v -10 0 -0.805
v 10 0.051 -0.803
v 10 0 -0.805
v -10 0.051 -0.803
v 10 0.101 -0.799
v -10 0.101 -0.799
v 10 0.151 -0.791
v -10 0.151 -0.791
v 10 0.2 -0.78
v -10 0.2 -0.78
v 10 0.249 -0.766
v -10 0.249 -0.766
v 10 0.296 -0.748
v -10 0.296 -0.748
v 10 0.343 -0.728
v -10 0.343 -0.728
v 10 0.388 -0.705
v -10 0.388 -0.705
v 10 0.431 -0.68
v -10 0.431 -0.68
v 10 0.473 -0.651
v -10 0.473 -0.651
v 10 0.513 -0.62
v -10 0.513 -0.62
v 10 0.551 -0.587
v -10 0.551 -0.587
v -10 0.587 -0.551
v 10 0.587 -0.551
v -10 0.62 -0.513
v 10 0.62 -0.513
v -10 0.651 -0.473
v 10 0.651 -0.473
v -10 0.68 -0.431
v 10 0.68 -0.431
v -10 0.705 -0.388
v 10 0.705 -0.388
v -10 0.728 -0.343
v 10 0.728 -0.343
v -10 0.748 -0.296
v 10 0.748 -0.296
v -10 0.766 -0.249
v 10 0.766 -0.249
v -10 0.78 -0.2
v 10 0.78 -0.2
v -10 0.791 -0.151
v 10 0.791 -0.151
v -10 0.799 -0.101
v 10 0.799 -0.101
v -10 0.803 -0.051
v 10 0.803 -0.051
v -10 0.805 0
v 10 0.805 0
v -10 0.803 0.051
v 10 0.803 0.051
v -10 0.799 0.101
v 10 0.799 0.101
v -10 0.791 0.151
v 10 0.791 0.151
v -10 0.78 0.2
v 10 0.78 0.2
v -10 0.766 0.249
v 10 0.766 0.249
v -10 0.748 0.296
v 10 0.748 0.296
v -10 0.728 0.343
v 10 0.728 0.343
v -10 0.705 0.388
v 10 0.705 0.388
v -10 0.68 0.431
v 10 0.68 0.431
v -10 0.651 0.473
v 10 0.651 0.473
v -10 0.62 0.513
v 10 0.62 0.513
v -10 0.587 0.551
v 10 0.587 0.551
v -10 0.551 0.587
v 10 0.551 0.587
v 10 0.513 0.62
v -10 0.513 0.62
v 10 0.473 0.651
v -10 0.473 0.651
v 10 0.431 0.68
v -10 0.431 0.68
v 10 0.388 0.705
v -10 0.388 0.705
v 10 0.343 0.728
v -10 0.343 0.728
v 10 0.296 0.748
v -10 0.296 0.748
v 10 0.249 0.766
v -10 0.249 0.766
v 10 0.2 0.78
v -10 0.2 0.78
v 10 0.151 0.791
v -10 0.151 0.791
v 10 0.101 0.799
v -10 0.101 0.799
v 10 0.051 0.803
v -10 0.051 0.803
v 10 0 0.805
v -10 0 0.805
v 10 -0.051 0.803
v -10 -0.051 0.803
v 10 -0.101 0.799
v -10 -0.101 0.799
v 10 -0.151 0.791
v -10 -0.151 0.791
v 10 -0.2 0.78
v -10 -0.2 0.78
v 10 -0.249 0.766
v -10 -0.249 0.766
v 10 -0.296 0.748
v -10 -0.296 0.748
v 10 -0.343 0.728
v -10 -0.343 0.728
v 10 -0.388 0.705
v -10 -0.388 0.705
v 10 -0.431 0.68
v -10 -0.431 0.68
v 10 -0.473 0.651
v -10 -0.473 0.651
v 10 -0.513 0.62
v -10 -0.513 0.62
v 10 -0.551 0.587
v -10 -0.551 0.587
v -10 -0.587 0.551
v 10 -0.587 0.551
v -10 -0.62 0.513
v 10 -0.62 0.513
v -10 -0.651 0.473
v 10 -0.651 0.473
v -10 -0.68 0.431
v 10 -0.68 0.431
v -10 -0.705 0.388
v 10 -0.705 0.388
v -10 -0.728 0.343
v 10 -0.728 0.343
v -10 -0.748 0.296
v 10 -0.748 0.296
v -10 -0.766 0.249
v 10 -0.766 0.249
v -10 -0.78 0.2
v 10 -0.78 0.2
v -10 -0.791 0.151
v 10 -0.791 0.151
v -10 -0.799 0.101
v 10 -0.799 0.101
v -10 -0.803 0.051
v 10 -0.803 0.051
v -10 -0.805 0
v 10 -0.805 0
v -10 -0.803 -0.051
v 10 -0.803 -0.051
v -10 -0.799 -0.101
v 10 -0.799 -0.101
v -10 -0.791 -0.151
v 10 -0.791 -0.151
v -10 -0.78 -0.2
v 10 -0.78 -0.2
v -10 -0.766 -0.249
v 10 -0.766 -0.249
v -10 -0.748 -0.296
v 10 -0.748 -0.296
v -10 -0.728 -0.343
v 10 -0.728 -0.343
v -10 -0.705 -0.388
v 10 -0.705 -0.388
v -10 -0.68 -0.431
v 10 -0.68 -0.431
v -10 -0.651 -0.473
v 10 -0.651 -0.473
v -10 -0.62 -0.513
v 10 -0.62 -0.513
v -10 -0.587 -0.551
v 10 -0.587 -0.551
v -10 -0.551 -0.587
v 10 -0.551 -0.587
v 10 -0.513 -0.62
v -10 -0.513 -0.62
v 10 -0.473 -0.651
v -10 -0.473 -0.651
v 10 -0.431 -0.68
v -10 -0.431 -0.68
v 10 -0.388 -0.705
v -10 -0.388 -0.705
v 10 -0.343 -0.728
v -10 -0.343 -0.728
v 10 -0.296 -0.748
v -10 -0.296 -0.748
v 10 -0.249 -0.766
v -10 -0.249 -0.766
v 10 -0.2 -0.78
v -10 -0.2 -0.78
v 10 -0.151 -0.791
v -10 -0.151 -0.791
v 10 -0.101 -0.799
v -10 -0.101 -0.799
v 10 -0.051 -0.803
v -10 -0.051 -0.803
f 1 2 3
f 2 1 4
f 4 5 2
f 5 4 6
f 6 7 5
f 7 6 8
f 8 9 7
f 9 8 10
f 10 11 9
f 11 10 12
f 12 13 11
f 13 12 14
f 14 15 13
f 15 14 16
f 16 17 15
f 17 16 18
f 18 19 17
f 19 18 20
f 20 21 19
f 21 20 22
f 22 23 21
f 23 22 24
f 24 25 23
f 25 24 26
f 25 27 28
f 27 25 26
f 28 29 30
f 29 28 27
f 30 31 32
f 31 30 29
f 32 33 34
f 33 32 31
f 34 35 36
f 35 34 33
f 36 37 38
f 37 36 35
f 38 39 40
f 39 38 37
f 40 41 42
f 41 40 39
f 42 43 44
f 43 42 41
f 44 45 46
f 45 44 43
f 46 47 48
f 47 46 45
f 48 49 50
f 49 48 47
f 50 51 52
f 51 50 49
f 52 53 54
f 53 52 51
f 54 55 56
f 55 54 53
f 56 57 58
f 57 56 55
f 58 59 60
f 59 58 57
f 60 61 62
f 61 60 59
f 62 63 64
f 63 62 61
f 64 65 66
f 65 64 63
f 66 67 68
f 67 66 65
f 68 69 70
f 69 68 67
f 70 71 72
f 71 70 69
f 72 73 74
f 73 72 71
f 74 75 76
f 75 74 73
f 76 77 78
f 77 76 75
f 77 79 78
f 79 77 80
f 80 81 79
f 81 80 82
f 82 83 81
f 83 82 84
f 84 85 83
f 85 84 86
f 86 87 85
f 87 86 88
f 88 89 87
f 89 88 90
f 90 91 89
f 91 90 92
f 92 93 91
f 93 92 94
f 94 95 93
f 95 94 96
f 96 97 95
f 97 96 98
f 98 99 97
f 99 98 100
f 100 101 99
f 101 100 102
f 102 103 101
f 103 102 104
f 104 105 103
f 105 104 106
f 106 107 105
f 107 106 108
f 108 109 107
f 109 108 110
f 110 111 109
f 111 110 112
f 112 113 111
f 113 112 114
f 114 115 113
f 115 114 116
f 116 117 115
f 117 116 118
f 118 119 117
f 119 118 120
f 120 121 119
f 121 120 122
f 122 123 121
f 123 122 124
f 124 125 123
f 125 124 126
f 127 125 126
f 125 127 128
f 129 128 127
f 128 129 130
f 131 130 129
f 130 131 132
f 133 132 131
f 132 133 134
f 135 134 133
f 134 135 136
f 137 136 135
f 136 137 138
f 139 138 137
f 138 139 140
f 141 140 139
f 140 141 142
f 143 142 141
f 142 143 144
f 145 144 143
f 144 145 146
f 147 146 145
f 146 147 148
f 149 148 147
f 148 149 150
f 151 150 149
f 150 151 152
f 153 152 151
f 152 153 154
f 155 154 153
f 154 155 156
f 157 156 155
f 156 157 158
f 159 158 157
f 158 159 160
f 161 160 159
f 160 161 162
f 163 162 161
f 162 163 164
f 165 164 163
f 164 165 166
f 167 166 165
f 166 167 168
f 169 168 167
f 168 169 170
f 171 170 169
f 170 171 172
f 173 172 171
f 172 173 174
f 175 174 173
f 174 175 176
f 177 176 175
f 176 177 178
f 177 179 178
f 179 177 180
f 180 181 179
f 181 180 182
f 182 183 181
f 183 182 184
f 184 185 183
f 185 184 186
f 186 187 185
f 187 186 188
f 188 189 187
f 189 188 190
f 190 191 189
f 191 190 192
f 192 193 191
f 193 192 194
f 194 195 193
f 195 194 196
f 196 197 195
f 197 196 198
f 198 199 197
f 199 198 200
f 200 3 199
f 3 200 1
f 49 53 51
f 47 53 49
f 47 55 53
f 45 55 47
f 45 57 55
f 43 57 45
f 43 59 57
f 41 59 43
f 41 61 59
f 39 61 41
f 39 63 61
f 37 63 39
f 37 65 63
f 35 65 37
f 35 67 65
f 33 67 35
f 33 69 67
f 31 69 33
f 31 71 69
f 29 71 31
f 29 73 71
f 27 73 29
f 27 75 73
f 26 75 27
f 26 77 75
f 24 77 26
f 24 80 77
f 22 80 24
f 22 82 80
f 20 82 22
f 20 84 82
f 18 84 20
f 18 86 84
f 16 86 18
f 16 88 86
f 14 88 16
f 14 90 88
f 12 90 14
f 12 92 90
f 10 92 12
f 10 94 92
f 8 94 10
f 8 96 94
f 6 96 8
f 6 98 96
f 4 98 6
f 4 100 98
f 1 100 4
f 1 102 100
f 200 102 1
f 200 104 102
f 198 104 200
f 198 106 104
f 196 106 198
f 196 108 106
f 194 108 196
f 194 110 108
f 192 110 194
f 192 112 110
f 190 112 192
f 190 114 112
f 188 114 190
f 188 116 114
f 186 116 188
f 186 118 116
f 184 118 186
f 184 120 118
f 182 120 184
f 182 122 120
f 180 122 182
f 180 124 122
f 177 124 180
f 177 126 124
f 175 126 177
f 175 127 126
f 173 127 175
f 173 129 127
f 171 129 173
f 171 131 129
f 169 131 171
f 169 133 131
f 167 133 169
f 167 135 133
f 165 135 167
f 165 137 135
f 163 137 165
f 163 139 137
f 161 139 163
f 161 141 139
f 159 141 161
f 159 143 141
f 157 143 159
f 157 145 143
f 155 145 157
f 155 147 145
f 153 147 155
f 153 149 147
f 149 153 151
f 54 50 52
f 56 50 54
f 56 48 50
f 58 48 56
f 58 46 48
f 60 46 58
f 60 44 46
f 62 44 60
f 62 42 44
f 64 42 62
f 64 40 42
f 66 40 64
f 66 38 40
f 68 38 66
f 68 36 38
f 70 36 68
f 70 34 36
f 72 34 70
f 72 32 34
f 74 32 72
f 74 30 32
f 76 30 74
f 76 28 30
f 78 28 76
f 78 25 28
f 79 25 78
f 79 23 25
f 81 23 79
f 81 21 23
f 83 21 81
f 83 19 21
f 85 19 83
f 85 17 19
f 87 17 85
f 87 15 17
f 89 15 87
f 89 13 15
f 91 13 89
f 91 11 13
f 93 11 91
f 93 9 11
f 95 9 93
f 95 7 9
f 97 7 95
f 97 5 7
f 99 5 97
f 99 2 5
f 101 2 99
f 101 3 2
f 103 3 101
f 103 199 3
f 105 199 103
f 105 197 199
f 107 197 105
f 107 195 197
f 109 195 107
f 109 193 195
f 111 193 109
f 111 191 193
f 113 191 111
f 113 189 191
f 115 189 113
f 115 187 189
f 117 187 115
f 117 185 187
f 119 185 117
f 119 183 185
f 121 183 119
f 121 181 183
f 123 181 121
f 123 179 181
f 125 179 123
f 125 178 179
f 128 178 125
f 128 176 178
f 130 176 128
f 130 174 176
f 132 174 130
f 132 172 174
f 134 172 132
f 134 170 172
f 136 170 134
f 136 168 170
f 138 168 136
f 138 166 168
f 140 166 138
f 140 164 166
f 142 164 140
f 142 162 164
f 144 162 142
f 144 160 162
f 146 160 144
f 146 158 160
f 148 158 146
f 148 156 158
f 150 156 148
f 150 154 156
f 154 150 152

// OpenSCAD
len = 20; // 100;
deep = 12.5;
d = 1.61; // 1/16"
turn_radius = 2;

$fn = 100;

module outline() {
    module e() {
        translate([len/2 - d/2, deep/2, 0])
        rotate([90, 0, 0])
        cylinder(h = deep, r = d/2, center=true);
    }


     translate([0, 0, 0]) {
        rotate([0, 90, 0])
        cylinder(h = len, r = d/2, center=true);


        
        // e();
        // mirror([1, 0, 0]) e();
    }
}


outline();



module side() {

    
    translate([len/2 - turn_radius, turn_radius/2, 0])

    rotate([0, 0, 90 * 3])
    rotate_extrude( angle=90)
    translate([turn_radius/2,0,0])
    circle(r = d/4);
    
    
    color("blue")
    translate([len/2 - d/2, deep, 0])
    rotate([90, 0, 0])
    cylinder(h = deep - turn_radius/2, r = d/2);
    
}

//rotate([0, 90, 0])
//cylinder(h = len - turn_radius, r = d/2, center=true);

//side();
///mirror([1, 0, 0]) side();

//square([2,10], center=true);
